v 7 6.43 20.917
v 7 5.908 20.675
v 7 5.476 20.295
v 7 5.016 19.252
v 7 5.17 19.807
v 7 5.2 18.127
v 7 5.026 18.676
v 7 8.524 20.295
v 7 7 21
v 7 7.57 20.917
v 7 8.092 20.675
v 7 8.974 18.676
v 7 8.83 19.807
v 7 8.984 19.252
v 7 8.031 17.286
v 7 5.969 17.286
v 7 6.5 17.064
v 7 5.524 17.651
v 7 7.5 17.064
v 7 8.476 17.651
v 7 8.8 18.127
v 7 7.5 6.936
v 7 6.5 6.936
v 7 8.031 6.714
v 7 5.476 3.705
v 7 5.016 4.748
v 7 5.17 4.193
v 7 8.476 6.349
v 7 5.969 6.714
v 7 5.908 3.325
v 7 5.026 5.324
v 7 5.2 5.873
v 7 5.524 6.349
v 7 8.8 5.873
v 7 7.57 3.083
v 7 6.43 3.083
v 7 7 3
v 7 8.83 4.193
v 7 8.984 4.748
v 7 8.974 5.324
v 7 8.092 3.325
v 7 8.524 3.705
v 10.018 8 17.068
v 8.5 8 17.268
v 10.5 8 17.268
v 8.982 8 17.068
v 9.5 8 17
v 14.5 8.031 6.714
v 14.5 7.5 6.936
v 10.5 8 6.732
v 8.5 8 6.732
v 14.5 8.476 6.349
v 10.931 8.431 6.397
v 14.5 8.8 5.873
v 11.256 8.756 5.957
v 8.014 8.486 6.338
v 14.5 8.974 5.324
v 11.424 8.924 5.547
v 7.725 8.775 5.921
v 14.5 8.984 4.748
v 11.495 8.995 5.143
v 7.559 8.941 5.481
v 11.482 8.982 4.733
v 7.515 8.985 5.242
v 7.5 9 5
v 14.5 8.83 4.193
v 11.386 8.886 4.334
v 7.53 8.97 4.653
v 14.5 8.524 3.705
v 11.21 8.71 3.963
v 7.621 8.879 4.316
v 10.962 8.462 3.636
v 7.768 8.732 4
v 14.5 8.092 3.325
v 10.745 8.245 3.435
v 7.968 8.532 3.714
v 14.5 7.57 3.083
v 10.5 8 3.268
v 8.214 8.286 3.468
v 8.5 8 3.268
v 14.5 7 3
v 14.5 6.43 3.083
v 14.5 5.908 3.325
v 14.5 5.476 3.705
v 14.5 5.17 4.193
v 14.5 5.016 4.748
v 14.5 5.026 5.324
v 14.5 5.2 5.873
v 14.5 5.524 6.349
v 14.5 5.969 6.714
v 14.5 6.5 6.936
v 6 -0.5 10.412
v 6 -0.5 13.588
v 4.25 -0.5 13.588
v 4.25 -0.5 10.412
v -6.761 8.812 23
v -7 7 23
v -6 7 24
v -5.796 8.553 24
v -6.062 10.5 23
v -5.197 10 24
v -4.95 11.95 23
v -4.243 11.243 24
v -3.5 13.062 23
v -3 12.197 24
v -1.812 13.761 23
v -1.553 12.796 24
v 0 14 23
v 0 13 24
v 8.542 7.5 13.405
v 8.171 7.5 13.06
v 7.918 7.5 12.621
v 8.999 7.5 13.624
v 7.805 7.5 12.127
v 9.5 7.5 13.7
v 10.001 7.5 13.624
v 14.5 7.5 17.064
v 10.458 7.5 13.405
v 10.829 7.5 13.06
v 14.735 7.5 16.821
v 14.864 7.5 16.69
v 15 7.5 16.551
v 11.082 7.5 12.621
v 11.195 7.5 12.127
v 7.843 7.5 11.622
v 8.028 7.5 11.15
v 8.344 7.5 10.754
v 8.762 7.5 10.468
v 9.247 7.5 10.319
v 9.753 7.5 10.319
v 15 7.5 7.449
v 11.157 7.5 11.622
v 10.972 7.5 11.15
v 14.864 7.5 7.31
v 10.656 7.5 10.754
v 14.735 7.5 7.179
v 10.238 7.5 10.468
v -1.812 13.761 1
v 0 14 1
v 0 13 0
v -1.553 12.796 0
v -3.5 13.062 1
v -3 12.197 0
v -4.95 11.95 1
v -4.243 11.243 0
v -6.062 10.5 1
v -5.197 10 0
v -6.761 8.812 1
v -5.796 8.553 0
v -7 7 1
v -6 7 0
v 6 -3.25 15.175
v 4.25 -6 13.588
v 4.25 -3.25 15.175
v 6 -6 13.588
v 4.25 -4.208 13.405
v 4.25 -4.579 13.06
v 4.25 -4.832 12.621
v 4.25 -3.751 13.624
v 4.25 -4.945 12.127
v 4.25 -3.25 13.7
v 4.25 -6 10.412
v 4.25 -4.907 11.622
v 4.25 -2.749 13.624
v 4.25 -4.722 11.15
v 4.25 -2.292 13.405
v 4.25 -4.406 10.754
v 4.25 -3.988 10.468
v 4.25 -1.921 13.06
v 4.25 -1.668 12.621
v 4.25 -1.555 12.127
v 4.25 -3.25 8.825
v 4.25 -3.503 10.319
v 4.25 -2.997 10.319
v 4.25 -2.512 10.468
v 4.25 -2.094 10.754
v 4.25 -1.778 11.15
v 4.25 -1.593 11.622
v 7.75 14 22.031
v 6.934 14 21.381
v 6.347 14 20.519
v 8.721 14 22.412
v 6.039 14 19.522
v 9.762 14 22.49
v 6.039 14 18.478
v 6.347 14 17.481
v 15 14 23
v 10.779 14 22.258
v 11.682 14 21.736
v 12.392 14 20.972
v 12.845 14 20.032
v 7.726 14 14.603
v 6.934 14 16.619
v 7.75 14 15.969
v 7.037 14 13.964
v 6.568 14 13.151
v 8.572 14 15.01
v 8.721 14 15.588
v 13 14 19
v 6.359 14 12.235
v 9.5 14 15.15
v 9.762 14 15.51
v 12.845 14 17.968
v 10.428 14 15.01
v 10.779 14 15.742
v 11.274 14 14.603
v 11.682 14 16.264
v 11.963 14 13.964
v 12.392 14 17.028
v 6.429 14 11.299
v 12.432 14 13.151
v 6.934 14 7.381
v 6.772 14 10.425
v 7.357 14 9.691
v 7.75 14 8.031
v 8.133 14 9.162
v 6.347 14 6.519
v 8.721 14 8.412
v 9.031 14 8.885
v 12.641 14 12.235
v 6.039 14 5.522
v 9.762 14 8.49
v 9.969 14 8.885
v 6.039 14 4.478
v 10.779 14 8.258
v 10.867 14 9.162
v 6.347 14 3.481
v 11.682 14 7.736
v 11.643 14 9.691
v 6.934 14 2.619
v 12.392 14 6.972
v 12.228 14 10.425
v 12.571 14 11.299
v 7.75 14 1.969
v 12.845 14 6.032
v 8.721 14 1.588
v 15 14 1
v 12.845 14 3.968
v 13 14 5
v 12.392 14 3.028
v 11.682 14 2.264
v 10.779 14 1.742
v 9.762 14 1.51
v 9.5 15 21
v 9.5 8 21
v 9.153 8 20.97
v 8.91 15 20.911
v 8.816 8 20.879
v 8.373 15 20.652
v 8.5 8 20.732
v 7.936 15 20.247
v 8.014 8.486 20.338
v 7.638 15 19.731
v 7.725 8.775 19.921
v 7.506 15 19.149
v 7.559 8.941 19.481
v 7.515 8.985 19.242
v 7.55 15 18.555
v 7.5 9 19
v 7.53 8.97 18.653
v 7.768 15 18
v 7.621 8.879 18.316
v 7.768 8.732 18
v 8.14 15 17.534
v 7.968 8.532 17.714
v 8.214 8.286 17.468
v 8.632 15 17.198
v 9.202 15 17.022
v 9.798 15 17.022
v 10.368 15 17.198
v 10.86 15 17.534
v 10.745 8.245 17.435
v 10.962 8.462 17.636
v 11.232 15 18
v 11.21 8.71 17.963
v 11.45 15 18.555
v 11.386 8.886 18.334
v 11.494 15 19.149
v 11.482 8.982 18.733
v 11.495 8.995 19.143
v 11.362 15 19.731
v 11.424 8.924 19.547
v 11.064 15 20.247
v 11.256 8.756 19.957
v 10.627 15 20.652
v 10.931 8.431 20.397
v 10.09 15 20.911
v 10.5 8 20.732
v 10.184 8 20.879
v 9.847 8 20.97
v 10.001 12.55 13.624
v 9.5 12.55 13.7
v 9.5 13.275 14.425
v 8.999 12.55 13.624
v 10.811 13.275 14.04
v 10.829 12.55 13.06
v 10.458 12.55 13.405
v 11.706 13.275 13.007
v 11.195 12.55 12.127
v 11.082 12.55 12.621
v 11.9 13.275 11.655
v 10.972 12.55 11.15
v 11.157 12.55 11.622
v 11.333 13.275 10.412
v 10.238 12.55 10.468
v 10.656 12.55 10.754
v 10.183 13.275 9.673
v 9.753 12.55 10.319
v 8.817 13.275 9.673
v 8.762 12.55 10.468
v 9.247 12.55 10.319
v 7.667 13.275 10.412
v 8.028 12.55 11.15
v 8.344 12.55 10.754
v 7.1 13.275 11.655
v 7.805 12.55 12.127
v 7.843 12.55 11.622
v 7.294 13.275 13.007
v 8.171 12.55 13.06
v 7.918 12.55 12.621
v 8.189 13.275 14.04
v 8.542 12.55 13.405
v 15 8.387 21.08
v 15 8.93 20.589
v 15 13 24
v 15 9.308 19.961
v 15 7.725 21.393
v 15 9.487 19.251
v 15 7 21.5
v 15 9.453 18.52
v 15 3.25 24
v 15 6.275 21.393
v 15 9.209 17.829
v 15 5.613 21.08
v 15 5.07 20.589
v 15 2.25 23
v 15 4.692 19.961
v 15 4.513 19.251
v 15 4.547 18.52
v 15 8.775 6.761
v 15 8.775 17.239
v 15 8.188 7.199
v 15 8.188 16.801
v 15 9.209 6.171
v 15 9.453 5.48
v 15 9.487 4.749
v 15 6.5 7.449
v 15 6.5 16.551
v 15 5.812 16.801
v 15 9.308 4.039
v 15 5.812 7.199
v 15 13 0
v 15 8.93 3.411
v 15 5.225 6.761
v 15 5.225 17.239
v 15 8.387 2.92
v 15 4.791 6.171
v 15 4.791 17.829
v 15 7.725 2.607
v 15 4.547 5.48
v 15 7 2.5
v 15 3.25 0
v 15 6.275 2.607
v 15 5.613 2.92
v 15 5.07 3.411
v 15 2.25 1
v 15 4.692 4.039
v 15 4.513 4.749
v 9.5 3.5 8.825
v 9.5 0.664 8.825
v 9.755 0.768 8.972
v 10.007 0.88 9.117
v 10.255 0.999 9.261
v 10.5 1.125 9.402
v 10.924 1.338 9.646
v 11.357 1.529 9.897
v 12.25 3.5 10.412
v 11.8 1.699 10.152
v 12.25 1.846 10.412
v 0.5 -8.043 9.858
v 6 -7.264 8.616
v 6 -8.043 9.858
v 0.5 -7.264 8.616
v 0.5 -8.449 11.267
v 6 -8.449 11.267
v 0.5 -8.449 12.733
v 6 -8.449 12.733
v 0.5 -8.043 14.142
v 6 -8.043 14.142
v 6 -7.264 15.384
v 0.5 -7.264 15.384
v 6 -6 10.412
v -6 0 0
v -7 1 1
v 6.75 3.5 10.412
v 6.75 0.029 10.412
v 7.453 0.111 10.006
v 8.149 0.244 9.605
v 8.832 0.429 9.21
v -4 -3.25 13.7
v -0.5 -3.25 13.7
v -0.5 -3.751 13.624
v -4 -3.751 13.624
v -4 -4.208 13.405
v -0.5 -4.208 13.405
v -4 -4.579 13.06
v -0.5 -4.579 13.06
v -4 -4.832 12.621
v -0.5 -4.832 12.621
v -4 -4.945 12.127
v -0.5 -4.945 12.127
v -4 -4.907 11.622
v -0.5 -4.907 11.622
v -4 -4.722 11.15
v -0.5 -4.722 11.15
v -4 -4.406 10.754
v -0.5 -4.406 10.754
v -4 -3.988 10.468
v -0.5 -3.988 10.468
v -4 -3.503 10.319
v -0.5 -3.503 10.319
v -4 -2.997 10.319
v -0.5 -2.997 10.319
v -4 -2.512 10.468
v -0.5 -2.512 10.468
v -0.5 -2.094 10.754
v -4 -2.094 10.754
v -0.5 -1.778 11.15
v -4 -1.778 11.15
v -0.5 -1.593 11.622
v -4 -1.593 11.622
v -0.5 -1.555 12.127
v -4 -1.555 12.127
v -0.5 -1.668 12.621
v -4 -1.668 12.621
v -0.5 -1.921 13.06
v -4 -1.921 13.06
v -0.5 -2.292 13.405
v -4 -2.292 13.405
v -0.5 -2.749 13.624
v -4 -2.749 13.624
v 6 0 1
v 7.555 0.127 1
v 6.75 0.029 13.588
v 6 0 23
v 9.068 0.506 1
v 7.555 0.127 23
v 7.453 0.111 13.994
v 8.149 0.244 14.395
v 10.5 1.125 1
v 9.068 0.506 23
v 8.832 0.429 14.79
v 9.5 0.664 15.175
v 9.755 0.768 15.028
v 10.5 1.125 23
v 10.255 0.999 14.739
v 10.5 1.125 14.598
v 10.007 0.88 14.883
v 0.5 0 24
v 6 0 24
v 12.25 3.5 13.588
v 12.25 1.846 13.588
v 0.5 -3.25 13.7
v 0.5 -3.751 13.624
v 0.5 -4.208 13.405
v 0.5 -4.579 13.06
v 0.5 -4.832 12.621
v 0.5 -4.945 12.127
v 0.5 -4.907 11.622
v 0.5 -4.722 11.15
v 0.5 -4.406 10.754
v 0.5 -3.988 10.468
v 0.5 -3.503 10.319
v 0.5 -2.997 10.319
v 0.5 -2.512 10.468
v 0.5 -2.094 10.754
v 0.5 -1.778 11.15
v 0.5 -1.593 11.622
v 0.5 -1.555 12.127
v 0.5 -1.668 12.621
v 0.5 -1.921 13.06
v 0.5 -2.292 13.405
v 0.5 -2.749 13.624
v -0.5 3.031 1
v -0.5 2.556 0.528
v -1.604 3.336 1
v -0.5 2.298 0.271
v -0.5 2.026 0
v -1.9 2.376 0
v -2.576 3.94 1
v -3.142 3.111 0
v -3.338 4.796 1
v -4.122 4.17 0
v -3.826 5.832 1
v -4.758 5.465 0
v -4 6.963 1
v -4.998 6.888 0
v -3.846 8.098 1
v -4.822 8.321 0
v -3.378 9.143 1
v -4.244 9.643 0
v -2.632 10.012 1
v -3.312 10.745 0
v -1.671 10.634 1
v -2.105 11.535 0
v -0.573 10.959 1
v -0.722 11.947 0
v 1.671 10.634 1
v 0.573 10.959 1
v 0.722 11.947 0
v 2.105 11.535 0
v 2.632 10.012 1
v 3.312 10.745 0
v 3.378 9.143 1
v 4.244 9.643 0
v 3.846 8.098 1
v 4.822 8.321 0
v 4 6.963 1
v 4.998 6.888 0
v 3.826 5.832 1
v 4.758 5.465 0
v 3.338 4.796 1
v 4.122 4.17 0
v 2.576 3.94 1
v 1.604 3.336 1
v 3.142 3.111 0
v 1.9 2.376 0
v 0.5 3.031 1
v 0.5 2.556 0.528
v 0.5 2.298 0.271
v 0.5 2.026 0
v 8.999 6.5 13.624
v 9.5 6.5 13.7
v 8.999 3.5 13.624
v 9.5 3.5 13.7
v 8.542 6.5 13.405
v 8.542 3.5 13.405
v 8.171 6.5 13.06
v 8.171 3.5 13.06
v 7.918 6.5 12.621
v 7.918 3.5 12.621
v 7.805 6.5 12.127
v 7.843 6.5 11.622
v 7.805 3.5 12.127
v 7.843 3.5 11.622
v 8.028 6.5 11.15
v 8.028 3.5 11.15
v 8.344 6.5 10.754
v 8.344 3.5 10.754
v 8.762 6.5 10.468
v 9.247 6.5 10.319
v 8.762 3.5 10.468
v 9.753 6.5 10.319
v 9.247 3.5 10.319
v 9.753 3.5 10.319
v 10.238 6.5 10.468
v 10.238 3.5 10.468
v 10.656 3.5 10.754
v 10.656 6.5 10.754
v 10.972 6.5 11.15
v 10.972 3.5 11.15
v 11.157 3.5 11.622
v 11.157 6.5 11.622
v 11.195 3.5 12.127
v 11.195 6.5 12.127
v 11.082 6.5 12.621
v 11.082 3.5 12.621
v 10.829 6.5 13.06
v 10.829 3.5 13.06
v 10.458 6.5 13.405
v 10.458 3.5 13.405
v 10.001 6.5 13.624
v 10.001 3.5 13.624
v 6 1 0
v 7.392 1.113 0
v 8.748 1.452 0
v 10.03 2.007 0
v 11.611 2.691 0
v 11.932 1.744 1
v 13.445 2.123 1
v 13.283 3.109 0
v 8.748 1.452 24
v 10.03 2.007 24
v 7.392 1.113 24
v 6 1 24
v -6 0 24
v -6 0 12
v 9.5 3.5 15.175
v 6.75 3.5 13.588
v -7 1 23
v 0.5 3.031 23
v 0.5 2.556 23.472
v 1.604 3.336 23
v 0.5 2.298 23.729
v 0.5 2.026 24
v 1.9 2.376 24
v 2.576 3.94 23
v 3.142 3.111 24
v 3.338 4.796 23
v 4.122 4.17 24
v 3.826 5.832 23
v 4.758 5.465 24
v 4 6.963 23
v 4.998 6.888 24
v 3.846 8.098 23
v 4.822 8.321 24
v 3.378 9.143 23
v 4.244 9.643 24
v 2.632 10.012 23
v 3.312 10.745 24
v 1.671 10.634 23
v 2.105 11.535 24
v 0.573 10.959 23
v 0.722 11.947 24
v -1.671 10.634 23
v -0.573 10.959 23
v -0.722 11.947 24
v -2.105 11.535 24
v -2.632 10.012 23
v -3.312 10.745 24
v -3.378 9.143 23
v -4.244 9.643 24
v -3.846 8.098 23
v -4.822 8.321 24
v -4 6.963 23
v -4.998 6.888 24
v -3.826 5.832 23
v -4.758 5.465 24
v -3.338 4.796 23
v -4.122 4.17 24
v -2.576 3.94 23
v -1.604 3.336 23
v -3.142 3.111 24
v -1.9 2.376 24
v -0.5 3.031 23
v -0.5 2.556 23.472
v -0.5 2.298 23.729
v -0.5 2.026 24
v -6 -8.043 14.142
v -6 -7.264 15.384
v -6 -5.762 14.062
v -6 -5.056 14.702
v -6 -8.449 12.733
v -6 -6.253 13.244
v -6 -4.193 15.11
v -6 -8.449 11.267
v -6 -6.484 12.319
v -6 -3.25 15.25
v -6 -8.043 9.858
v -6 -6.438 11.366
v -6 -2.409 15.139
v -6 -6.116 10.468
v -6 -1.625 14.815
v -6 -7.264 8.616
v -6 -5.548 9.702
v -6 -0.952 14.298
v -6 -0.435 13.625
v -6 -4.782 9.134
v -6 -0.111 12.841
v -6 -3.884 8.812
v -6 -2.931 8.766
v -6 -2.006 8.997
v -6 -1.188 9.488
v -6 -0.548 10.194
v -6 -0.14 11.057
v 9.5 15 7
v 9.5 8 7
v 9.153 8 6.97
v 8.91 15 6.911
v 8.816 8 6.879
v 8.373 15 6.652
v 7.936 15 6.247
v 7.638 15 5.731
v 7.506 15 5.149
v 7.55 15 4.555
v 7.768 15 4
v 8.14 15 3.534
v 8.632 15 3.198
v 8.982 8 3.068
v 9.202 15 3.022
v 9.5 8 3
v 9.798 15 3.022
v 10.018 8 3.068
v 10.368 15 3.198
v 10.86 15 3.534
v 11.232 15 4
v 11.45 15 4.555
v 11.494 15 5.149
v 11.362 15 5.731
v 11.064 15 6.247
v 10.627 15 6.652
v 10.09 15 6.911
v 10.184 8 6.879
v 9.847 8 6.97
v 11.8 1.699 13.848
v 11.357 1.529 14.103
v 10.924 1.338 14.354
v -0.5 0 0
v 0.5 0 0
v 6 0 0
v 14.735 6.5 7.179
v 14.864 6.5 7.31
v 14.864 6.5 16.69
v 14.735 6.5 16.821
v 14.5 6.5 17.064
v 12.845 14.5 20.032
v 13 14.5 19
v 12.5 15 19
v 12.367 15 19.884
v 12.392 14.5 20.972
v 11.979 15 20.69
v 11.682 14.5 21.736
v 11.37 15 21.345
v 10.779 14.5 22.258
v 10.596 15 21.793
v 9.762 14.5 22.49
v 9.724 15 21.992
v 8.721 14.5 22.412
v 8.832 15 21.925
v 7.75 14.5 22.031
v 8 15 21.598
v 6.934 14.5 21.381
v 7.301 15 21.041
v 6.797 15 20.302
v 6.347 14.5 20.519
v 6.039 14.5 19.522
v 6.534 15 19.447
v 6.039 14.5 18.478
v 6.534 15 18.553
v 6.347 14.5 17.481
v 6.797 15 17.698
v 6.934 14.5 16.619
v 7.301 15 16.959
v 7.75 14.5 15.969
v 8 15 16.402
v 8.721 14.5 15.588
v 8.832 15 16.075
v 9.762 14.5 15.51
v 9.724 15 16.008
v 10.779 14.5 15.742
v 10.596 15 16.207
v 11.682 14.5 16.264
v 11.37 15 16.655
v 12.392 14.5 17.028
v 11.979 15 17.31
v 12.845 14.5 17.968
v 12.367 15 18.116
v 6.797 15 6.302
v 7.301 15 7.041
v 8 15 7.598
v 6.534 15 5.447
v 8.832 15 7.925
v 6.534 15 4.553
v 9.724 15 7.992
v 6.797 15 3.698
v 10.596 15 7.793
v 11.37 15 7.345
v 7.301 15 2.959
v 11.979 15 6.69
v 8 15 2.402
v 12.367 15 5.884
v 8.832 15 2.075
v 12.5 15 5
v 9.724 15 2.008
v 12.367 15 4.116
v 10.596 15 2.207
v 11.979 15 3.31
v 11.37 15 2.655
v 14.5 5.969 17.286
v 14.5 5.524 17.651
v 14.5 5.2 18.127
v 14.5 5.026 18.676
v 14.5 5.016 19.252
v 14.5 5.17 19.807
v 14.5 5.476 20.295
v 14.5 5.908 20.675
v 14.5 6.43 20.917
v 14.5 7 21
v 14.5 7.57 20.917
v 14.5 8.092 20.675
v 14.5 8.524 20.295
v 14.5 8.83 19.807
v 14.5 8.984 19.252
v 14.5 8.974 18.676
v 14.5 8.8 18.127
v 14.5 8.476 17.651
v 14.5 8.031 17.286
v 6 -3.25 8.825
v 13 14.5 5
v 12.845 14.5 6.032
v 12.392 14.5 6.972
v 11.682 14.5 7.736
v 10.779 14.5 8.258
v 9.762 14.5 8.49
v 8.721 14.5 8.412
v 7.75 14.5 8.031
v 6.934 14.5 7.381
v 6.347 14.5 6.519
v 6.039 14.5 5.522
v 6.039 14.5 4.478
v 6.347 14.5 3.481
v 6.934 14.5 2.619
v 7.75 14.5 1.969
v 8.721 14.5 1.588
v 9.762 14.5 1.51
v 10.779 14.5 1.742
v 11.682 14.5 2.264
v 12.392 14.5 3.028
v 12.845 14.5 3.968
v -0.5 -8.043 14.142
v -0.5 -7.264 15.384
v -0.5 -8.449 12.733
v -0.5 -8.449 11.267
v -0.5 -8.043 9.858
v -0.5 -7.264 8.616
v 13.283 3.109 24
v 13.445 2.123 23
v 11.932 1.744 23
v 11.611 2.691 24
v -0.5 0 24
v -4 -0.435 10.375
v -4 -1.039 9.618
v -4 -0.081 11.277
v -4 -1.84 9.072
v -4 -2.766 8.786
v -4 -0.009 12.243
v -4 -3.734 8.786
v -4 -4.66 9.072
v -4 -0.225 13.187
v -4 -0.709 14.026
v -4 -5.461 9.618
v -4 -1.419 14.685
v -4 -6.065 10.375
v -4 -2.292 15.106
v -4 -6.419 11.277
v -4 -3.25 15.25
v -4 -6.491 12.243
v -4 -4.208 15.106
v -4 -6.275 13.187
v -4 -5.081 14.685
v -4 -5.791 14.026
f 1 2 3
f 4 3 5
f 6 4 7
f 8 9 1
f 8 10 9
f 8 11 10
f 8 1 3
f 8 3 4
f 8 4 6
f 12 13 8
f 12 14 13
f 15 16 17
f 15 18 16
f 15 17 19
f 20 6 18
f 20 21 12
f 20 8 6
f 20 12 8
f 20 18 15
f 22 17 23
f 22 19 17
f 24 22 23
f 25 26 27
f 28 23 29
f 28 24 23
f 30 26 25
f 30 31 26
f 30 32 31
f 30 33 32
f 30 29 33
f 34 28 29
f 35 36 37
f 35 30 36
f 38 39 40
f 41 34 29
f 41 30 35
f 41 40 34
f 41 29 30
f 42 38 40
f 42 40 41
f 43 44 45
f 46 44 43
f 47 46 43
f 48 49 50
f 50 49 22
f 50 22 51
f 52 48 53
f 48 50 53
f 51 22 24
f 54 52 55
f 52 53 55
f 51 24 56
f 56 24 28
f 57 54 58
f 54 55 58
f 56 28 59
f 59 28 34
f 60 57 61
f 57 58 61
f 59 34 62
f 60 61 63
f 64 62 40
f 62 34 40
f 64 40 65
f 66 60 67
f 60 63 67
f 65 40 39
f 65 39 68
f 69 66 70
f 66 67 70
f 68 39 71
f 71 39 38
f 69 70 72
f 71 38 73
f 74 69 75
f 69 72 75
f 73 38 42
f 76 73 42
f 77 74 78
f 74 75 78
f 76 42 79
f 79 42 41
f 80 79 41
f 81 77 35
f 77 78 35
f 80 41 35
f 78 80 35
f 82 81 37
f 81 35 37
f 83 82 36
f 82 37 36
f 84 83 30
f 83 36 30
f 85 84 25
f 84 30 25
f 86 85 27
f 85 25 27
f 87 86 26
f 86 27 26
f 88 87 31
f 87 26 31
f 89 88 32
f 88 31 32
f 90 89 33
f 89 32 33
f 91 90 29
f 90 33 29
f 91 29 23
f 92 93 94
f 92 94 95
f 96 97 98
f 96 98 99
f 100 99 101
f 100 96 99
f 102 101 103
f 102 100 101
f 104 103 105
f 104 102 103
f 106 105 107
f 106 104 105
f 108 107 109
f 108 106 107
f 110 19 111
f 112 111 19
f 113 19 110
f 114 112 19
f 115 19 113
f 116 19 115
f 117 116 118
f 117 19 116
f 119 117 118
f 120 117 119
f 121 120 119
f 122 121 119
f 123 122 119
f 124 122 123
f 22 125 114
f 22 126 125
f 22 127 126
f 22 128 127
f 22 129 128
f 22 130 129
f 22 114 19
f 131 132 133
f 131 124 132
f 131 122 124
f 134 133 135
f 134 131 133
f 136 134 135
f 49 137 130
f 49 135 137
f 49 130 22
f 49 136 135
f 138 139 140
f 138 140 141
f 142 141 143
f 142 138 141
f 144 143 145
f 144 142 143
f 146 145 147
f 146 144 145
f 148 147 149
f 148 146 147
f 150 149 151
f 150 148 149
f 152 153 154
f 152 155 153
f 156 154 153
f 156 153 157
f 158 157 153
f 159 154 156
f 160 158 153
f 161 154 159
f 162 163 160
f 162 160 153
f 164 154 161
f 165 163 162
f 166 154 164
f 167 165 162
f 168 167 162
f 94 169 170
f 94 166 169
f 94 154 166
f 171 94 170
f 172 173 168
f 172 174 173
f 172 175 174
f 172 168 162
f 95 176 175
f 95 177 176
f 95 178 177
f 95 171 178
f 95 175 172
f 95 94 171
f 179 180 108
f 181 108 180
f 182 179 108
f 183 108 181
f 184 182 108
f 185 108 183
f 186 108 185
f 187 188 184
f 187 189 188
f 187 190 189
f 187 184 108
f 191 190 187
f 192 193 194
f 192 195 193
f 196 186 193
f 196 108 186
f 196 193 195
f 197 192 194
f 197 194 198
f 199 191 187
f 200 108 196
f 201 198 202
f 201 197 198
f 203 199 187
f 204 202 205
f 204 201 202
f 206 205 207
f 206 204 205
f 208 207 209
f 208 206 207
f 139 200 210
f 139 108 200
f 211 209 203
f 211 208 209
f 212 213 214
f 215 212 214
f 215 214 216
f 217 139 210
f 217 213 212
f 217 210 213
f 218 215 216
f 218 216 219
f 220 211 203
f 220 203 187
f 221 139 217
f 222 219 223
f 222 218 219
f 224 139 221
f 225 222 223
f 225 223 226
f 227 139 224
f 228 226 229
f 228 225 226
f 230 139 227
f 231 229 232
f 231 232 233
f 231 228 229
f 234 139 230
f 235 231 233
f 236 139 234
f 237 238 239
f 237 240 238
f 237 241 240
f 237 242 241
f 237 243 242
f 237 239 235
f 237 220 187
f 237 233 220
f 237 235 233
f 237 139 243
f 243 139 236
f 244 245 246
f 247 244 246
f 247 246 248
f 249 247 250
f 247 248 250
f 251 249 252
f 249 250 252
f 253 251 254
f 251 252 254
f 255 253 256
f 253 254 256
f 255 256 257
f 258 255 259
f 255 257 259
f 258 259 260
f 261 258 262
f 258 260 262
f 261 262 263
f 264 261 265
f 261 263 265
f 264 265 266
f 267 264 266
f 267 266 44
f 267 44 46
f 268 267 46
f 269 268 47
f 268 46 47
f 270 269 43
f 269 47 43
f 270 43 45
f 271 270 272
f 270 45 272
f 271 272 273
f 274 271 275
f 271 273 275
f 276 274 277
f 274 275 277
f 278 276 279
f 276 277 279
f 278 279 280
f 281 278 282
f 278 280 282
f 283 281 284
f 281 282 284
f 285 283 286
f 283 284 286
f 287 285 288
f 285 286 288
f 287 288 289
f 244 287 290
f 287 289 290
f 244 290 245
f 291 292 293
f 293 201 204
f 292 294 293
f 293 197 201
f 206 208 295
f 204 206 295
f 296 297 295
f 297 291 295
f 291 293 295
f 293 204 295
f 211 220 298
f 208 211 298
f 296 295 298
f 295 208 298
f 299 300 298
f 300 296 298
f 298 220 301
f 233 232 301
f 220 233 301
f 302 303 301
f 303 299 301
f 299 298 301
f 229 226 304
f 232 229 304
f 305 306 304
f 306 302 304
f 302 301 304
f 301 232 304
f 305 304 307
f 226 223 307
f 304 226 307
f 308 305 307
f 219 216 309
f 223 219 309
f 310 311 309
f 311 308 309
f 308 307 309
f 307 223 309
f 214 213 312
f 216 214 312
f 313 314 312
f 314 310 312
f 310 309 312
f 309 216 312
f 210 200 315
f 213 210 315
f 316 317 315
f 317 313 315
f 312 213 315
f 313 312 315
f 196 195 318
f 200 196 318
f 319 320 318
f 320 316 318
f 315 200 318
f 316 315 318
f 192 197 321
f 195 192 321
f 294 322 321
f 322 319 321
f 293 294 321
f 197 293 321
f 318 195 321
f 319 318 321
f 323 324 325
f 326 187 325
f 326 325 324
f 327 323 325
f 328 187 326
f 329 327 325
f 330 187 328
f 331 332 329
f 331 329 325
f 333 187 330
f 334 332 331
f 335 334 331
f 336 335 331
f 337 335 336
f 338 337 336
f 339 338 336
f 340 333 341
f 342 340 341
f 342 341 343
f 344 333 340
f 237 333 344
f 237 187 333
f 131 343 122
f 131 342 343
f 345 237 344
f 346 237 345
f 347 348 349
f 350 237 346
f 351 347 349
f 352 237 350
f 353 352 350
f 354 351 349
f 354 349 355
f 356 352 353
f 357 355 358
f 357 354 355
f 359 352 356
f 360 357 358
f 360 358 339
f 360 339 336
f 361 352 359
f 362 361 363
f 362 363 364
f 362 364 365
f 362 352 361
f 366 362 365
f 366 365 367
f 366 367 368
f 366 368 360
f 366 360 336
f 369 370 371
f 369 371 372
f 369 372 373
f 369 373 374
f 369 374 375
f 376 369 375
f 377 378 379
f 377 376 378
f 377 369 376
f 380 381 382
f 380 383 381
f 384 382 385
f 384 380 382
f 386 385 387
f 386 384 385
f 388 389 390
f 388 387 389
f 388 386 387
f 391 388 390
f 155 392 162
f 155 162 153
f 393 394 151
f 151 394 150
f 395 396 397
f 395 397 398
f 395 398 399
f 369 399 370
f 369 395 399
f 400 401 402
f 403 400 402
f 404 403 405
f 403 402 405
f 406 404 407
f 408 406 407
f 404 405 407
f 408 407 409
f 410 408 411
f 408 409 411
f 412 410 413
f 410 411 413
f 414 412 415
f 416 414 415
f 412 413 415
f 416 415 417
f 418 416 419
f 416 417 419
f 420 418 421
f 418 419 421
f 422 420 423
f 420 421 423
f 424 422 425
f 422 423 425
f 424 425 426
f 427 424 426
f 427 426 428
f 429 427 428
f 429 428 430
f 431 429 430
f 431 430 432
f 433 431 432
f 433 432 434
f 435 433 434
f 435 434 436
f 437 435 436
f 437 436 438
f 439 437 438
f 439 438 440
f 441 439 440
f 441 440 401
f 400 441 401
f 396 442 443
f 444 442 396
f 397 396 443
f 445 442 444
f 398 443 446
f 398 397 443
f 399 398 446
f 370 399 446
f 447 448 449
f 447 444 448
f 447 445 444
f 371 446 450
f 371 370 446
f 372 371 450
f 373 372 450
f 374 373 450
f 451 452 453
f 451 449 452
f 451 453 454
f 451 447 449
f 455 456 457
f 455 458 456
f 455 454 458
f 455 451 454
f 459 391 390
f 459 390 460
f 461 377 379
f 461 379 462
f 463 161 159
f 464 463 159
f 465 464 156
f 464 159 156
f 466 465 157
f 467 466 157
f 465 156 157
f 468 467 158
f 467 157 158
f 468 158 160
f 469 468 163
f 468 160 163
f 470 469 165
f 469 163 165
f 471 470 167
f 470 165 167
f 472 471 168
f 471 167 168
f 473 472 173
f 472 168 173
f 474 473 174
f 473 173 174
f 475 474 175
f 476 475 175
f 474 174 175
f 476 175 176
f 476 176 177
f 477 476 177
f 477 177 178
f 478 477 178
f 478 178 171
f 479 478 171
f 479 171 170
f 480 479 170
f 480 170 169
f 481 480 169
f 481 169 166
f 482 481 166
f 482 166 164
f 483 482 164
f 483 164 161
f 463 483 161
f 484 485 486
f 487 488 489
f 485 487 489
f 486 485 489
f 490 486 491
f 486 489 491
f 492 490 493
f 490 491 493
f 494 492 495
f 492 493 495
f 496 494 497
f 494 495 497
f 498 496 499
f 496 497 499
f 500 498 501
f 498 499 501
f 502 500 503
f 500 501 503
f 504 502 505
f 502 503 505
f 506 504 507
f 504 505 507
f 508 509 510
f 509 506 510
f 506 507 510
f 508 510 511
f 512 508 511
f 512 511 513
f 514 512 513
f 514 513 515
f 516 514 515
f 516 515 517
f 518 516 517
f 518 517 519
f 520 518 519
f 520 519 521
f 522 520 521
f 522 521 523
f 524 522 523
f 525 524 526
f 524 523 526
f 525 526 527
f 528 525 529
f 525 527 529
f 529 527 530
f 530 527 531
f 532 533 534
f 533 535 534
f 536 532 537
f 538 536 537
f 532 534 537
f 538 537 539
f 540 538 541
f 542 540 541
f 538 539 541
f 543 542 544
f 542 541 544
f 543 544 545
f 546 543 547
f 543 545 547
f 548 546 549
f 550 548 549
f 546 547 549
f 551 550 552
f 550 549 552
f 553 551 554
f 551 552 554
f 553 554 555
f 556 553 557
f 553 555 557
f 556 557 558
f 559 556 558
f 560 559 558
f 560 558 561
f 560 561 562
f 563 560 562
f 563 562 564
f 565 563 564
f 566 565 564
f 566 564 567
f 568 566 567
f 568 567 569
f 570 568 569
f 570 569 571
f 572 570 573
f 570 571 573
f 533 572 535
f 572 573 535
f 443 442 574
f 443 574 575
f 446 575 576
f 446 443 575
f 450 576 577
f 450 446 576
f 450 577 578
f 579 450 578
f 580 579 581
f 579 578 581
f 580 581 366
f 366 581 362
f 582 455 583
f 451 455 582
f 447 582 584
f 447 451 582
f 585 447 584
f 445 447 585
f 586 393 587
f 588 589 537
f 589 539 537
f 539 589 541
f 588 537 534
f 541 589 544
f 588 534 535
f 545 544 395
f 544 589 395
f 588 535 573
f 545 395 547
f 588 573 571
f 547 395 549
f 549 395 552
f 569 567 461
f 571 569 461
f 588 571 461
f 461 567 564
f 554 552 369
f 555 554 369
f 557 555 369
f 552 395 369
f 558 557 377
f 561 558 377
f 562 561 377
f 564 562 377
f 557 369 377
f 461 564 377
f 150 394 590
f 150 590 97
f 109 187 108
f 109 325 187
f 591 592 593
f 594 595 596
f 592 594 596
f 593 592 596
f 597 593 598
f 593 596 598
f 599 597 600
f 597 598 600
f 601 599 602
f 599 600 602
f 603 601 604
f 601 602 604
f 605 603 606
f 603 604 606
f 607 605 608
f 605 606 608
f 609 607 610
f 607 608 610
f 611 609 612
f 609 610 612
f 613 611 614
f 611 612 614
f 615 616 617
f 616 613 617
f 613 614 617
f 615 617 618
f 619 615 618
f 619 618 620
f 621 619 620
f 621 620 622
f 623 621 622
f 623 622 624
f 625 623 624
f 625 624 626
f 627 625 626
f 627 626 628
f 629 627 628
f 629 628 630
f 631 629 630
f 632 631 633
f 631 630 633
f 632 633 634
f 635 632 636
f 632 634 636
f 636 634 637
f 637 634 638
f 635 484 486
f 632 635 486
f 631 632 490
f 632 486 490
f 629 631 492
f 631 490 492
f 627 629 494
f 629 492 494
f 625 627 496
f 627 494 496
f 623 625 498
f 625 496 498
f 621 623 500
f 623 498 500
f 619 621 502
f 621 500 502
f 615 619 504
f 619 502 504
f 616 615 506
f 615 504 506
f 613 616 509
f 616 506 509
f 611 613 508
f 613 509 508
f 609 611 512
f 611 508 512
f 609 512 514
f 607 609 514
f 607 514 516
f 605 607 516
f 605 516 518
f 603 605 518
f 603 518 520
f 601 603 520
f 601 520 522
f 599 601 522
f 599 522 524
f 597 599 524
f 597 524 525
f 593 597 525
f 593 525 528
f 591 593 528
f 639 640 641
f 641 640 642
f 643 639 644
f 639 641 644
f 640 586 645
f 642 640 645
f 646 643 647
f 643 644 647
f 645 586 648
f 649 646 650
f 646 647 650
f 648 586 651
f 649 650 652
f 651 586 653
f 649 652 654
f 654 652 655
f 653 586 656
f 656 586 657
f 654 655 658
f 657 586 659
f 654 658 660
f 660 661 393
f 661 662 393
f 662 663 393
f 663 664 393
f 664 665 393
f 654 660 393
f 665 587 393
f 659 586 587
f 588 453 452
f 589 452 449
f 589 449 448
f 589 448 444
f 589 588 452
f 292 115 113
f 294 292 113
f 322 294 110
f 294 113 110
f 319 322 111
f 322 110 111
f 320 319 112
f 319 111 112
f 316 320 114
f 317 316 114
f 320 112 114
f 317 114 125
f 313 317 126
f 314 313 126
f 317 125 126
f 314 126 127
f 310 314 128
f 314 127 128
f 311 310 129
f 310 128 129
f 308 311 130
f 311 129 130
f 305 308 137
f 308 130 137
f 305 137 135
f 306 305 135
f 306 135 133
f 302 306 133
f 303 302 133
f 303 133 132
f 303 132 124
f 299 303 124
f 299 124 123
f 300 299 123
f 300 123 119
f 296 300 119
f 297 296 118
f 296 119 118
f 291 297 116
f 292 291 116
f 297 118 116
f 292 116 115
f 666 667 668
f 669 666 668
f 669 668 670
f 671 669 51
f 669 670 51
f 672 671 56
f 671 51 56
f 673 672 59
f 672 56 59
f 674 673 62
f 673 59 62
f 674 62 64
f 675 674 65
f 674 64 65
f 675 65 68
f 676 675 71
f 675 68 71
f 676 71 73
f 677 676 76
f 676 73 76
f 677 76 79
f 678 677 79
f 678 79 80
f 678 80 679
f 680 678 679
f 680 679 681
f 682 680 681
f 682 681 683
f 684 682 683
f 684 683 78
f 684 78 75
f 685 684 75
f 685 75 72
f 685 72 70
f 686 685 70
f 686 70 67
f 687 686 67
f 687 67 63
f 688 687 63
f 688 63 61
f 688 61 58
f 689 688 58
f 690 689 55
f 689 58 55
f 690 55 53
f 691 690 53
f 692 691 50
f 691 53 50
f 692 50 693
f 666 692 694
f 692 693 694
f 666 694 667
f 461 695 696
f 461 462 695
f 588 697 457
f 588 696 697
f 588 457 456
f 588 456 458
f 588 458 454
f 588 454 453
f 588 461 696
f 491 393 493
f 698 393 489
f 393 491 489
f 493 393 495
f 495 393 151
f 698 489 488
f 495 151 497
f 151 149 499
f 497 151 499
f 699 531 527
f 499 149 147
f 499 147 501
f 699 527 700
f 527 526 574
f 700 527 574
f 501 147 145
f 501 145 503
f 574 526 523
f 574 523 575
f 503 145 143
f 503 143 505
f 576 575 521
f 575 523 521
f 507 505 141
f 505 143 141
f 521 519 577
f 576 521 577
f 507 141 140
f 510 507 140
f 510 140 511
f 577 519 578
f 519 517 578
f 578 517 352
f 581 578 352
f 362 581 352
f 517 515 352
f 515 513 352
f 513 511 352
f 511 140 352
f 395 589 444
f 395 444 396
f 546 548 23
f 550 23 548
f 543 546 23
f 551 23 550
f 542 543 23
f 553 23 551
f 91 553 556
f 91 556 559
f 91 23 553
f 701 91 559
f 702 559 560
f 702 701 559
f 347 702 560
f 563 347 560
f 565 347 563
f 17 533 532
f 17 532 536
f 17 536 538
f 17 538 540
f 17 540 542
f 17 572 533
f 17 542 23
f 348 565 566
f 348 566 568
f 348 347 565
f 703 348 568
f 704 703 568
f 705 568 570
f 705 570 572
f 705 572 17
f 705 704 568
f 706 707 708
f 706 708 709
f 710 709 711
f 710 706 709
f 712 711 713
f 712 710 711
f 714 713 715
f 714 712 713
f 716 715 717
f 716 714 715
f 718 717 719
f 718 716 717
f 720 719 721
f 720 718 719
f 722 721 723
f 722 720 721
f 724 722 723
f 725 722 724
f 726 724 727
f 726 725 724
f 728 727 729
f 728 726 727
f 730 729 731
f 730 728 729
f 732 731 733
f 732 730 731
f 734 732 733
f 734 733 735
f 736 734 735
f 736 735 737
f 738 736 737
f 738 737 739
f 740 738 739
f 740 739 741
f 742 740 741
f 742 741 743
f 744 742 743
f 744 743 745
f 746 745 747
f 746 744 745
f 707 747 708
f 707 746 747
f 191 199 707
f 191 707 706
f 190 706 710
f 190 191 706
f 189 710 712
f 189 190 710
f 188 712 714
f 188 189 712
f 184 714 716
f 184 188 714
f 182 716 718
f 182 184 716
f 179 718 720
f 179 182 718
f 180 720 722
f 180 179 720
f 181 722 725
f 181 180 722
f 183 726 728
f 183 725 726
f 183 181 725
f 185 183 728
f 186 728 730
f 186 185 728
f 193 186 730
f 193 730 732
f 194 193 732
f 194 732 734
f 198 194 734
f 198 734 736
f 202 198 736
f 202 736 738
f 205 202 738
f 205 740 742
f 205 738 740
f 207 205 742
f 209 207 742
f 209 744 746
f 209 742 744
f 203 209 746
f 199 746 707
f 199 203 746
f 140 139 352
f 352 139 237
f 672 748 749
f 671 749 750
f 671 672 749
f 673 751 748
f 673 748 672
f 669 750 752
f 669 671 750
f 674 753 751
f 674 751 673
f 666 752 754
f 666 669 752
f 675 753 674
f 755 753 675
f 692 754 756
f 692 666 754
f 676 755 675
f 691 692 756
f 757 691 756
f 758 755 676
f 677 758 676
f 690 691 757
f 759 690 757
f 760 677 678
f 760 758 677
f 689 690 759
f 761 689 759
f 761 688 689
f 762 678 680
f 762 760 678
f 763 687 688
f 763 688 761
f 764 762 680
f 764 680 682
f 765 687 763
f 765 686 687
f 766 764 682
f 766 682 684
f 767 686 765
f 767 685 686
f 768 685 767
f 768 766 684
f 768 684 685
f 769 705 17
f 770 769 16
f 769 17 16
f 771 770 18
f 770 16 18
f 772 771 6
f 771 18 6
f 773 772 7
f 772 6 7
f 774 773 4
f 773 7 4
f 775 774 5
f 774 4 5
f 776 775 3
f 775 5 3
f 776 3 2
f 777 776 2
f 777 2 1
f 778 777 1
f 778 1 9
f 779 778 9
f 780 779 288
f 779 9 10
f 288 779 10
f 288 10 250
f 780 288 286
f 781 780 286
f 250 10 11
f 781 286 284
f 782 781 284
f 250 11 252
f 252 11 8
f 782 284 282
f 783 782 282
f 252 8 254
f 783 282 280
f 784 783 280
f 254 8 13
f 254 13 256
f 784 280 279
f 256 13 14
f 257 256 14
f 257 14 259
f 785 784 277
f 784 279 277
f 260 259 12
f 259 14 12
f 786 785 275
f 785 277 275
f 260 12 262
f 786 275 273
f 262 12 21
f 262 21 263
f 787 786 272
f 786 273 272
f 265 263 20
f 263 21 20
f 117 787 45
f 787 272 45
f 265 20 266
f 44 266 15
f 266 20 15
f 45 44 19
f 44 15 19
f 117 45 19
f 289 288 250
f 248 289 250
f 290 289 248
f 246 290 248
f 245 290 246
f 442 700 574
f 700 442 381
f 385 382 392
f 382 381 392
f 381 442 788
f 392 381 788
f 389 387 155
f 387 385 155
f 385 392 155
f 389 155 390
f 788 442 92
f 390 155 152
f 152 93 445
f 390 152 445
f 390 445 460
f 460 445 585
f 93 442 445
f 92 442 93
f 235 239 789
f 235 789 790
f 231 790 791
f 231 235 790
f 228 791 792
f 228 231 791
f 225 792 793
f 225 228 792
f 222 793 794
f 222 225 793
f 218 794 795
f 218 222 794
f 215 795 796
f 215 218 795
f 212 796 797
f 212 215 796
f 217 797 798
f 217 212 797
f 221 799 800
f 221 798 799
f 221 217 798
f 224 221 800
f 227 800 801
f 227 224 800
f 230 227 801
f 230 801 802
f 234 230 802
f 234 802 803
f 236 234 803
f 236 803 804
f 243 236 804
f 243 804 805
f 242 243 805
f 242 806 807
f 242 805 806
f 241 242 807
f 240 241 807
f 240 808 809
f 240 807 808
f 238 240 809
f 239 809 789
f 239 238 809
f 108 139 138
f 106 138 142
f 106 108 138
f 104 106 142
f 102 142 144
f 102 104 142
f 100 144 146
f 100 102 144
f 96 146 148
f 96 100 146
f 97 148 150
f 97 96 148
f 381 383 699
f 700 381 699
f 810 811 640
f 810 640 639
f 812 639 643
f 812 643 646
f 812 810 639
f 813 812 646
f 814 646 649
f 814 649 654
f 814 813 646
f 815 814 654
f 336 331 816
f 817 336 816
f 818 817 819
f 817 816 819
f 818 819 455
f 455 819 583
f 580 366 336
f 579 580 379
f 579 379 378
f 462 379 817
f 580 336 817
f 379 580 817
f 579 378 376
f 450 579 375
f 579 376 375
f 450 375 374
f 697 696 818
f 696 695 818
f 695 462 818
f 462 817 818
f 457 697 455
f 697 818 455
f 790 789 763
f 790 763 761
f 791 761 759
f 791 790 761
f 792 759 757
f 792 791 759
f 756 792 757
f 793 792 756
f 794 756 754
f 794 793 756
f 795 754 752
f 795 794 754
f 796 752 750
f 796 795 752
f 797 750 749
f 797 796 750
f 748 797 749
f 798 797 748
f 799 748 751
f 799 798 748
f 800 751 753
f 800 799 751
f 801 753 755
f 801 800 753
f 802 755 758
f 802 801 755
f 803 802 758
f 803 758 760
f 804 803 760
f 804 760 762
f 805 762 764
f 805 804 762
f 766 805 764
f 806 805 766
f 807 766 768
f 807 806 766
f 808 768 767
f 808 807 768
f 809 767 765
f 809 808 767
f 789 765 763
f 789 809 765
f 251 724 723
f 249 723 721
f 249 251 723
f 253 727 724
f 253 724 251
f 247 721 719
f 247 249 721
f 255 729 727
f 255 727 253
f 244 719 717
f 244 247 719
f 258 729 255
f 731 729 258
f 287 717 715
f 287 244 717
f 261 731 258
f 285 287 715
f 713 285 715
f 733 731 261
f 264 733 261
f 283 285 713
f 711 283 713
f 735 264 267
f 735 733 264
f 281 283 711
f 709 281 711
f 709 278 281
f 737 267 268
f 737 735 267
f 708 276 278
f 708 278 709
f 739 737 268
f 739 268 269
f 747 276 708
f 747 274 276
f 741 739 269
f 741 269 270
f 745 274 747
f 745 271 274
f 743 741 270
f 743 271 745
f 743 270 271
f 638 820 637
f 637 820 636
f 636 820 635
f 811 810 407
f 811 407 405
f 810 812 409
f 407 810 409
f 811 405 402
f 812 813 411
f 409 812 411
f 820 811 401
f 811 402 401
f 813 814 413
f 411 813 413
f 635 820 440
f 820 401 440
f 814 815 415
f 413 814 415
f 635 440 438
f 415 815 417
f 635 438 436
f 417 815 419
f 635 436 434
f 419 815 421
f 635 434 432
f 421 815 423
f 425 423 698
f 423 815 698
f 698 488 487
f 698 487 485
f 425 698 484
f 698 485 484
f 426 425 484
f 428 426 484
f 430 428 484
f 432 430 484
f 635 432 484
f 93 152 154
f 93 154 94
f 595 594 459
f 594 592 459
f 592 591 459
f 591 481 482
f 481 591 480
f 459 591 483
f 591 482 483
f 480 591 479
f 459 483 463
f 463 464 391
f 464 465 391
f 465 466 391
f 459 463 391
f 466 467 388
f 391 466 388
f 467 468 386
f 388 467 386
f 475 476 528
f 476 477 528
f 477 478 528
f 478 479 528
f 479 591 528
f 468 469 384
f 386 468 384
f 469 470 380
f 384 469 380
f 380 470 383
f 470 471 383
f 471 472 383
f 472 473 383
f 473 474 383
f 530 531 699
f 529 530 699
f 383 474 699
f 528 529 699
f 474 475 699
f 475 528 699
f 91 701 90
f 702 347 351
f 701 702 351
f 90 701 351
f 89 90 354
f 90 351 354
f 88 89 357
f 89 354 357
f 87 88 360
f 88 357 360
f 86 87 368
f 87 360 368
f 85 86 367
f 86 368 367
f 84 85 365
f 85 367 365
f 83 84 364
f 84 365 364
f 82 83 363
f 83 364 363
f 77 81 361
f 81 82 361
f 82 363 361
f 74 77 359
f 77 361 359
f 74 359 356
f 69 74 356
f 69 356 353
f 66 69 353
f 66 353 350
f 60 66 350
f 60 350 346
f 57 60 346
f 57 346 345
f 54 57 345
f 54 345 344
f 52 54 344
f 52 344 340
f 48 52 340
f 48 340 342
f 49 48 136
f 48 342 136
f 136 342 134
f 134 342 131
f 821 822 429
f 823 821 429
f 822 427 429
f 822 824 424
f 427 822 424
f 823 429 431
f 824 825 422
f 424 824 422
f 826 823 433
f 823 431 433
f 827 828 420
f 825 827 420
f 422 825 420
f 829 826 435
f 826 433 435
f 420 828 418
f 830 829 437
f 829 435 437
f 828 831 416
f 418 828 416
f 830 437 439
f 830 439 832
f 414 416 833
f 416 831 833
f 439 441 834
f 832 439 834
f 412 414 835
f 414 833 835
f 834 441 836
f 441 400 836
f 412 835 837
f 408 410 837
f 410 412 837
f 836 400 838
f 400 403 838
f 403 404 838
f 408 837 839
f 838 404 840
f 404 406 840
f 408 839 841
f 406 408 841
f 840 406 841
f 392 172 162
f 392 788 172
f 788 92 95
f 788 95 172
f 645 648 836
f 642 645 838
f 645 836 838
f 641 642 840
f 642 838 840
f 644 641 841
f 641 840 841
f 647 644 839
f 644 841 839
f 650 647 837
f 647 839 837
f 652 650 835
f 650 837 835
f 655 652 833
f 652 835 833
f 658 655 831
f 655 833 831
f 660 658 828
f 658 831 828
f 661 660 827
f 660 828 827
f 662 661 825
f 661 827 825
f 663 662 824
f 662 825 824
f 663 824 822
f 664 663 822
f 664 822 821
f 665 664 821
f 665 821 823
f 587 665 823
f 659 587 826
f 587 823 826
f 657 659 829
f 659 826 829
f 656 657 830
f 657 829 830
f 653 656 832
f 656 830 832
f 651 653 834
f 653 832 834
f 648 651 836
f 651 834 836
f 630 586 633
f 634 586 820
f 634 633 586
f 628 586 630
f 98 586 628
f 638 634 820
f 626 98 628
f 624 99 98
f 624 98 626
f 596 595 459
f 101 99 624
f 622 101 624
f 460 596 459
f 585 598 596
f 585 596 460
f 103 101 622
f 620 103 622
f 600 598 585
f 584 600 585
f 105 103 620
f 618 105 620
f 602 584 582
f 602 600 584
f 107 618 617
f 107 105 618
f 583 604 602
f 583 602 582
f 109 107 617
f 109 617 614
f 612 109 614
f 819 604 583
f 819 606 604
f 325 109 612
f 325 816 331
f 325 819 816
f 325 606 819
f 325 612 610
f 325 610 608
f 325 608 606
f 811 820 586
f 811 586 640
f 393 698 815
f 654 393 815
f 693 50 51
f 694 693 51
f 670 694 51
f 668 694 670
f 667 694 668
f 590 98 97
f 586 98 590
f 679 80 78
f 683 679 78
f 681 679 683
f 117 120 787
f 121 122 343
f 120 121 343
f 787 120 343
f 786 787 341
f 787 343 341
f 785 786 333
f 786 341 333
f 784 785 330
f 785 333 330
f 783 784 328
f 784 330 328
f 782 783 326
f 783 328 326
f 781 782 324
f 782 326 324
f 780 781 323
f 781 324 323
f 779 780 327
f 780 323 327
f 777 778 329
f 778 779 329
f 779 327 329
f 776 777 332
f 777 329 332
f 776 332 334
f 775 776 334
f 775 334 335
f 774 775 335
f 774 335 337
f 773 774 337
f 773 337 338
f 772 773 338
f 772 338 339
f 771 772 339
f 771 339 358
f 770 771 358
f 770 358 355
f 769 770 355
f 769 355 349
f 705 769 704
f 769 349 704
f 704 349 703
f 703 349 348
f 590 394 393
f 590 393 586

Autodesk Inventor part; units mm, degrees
ref_plane "YZ Plane" through (0, 0, 0) normal (1, 0, 0) x (0, 1, 0)
sketch "Sketch1" plane through (0, 0, 0) normal (0, 0, 1) x (1, 0, 0)
  line L0 (0, 14) -> (0, 11)
  line L1 (0, 14) -> (15, 14)
  line L2 (15, 14) -> (15, 0)
  circle A0 centre (0, 7) radius 4
  line L3 (0, 3) -> (0, 0) construction
  line L4 (0, 0) -> (15, 0)
  line L5 (0, 11) -> (0, 3) construction
  line L6 (0.5, 0) -> (-0.5, 0)
  line L7 (-0.5, 0) -> (-0.5, 3.0314)
  line L8 (-0.5, 3.0314) -> (0.5, 3.0314)
  line L9 (0.5, 3.0314) -> (0.5, 0)
  line L10 (-0.5, 0) -> (-7, 0)
  line L11 (-7, 0) -> (-7, 14)
  line L12 (-7, 14) -> (0, 14)
  line L13 (-4, 10.1012) -> (-4, 3.4286) construction
  point P0 (0, 3.0314)
  dimension "d0" = 8
  dimension "d1" = 15
  dimension "d2" = 14
  dimension "d79" = 1
  dimension "d80" = 3
  dimension "d81" = 3
extrude "Extrusion1" add sketch "Sketch1" along normal blind 24 contours L1 L2 L4 L9 A0 L0 | L0 A0 L7 L10 L11 L12
sketch "Sketch2" plane through (15, 0, 0) normal (1, 0, 0) x (0, 0, -1)
  line L0 (-24, 0) -> (-24, 14) projected
  line L1 (0, 0) -> (0, 14) projected
  point P0 (-19, 7)
  point P1 (-5, 7)
  point P2 (-24, 7)
  dimension "d5" = 5
  dimension "d6" = 5
  dimension "d7" = 14
hole "Hole1" at (15, 7, 19) at (15, 7, 5) direction (-1, 0, 0) diameter 4 depth 8
sketch "Sketch4" plane through (0, 14, 0) normal (0, 1, 0) x (1, 0, 0)
  circle A0 centre (9.5, -5) radius 3.5
  circle A1 centre (9.5, -19) radius 3.5
  line L0 (15, -24) -> (-7, -24) projected
  line L1 (15, 0) -> (0, 0) projected
  line L2 (-0.5, 0) -> (0.5, 0) projected
  line L3 (-0.5, -24) -> (0.5, -24) projected
  line L4 (4, -24) -> (4, 0) projected
  line L5 (4, -24) -> (4, 0)
  line L6 (4, -24) -> (4, 0) projected
  line L7 (15, 0) -> (15, -24) projected
  line L8 (0.5, 0) -> (0.5, -24) projected
  line L9 (-0.5, 0) -> (-0.5, -24) projected
  point P0 (4, -24)
  point P1 (0, -24)
  dimension "d18" = 7
  dimension "d19" = 7
  dimension "d20" = 14
  dimension "d21" = 5
  dimension "d22" = 5
  dimension "d42" = 5.5
  dimension "d43" = 5.5
extrude "Extrusion2" add sketch "Sketch4" along normal blind 1 contours A0 | A1
sketch "Sketch3" plane through (2, 15, 0) normal (0, 1, 0) x (1, 0, 0)
  circle A0 centre (7.5, -5) radius 3.5 projected
  circle A1 centre (7.5, -19) radius 3.5 projected
hole "Hole2" at (9.5, 15, 19) at (9.5, 15, 5) direction (0, -1, 0) diameter 4 depth 7
sketch "Sketch5" plane through (15, 0, 0) normal (1, 0, 0) x (0, 0, -1)
  line L0 (-17.0635, 7.5) -> (-6.9365, 7.5)
  line L1 (-6.9365, 7.5) -> (-6.9365, 6.5)
  line L2 (-6.9365, 6.5) -> (-17.0635, 6.5)
  line L3 (-17.0635, 6.5) -> (-17.0635, 7.5)
  circle A0 centre (-5, 7) radius 2 projected
  circle A1 centre (-19, 7) radius 2 projected
  point P0 (0, 0)
  point P1 (-6.9365, 7)
  point P2 (-17.0635, 6.5)
  dimension "d35" = 1
extrude "Extrusion3" cut sketch "Sketch5" against normal blind 8 contours L0 A0 L2 A1
sketch "Sketch7" plane through (0, 14, 0) normal (0, 1, 0) x (1, 0, 0)
  circle A0 centre (9.5, -5) radius 2 projected
  circle A1 centre (9.5, -19) radius 2 projected
  point P0 (0, 0)
  point P1 (9.5, -12)
  dimension "d44" = 7
  dimension "d45" = 7
hole "Hole3" at (9.5, 14, 12) direction (0, -1, 0) diameter 3.4 end through all countersink diameter 6.3 countersink angle 90 clearance for "Flat Head Machine Screw" size "M3" standard "Ansi Metric M Profile"
chamfer "Chamfer3" distance 0.5 angle 45 2 edges at (15, 7, 21) (15, 7, 3)
ref_plane "Work Plane1" through (7, 3.5, 17.0635) normal (0, 1, 0) x (1, 0, 0)
sketch "Sketch10" plane through (7, 3.5, 17.0635) normal (0, 1, 0) x (1, 0, 0)
  circle A0 centre (2.5, 5.0635) radius 1.7 projected
  line L0 (-0.25, 3.4758) -> (-0.25, 6.6512)
  line L1 (-0.25, 6.6512) -> (2.5, 8.2389)
  line L2 (2.5, 8.2389) -> (5.25, 6.6512)
  line L3 (5.25, 6.6512) -> (5.25, 3.4758)
  line L4 (5.25, 3.4758) -> (2.5, 1.8881)
  line L5 (2.5, 1.8881) -> (-0.25, 3.4758)
  point P0 (-7, 17.0635)
  dimension "d75" = 5.5
extrude "Extrusion6" cut sketch "Sketch10" against normal blind 10
sketch "Sketch12" plane through (-0.5, 0, 0) normal (1, 0, 0) x (0, 0, -1)
  circle A0 centre (-12, -3.25) radius 1.7
  circle A1 centre (-12, -3.25) radius 5.25
  line L0 (0, 0) -> (-8.616, -7.2639)
  line L1 (-24, 0) -> (-15.384, -7.2639)
  circle A2 centre (-12, -3.25) radius 3.25
  line L2 (0, 0) -> (-24, 0) projected
  point P0 (-12, 0)
  dimension "d82" = 3.4
  dimension "d84" = 2
  dimension "d95" = 6.5
extrude "Extrusion7" add sketch "Sketch12" against normal blind 5.5 contours A0 | A2 | A1 L2 | L1 L2 A1 | A1 L2 L0 picked at (-14.5812, -7.0055)
ref_plane "Work Plane3" through (0, 3.0314, 24) normal (1, 0, 0) x (0, 0, -1)
mirror "Mirror1" about plane through (0, 3.0314, 24) normal (1, 0, 0) of "Extrusion7"
fillet "Fillet1" radius 7 1 edges at (-7, 14, 12)
sketch "Sketch14" plane through (6.75, 3.5, 13.5877) normal (1, 0, 0) x (0, 0, -1)
  arc A0 (-1.7963, -10.7639) -> (4.9717, -10.7639) centre (1.5877, -6.75) ccw projected
  line L0 (0, -9.5) -> (-1.5877, -6.75)
  line L1 (-1.5877, -6.75) -> (0, -4)
  line L2 (0, -4) -> (3.1754, -4)
  line L3 (3.1754, -4) -> (4.7631, -6.75)
  line L4 (4.7631, -6.75) -> (3.1754, -9.5)
  line L5 (3.1754, -9.5) -> (0, -9.5)
  point P0 (13.5877, -3.5)
  dimension "d96" = 5.5
extrude "Extrusion8" cut sketch "Sketch14" against normal blind 2.5
sketch "Sketch13" plane through (-7, 0, 0) normal (-1, 0, 0) x (0, 0, 1)
  arc A0 (8.616, -7.2639) -> (15.384, -7.2639) centre (12, -3.25) ccw projected
  point P0 (0, 0)
hole "Hole4" at (-7, -3.25, 12) direction (1, 0, 0) diameter 3.4 end through all counterbore diameter 6.5 counterbore depth 3 clearance for "Socket Head Cap Screw" size "M3" standard "Ansi Metric M Profile"
sketch "Sketch15" plane through (0, 0, 24) normal (0, 0, 1) x (1, 0, 0)
  line L0 (6, 0) -> (15, 0) projected
  line L1 (15, 0) -> (15, 14) projected
  line L2 (14.5, 9) -> (14.5, 5) projected
  line L3 (15, 4.5) -> (15, 9.5) projected
  line L4 (6, 0) -> (15, 0) projected
  arc A0 (6, 0) -> (10.5, 1.125) centre (6, 9.5625) ccw
  line L5 (15, 0) -> (15, 14) projected
  arc A1 (15, 2.25) -> (10.5, 1.125) centre (15, -7.3125) ccw
  line L6 (15, 4.5) -> (15, 9.5) projected
  line L7 (15, 4.5) -> (15, 0)
  line L8 (15, 2.25) -> (10.6581, 2.25) construction
  point P0 (0, 0)
  point P1 (14.5, 6.5)
  point P2 (14.5, 7.5)
  point P3 (15, 7.5)
  point P4 (15, 6.5)
  point P5 (15, 2.25)
extrude "Extrusion9" cut sketch "Sketch15" against normal blind 28.75
chamfer "Chamfer5" distance 1 angle 45 13 edges at (0, 11, 24) (0, 11, 0) (-4.9497, 11.9497, 0) (-7, 3.5, 0) (7.5, 14, 0) (7.5, 14, 24) (-4.9497, 11.9497, 24) (-7, 3.5, 24) (-7, 0, 12) (8.3192, 0.2855, 0) (12.6808, 1.9645, 0) (12.6808, 1.9645, 24) (8.3192, 0.2855, 24)
chamfer "Chamfer6" distance 0.5 angle 45 2 edges at (6, 15, 19) (6, 15, 5)
equation "\"d81\" = d80"
equation "\"d6\" = d5"
equation "\"d22\" = d21"
equation "\"d42\" = d43"
equation "\"d44\" = d45"
properties part number "XY Joiner"
